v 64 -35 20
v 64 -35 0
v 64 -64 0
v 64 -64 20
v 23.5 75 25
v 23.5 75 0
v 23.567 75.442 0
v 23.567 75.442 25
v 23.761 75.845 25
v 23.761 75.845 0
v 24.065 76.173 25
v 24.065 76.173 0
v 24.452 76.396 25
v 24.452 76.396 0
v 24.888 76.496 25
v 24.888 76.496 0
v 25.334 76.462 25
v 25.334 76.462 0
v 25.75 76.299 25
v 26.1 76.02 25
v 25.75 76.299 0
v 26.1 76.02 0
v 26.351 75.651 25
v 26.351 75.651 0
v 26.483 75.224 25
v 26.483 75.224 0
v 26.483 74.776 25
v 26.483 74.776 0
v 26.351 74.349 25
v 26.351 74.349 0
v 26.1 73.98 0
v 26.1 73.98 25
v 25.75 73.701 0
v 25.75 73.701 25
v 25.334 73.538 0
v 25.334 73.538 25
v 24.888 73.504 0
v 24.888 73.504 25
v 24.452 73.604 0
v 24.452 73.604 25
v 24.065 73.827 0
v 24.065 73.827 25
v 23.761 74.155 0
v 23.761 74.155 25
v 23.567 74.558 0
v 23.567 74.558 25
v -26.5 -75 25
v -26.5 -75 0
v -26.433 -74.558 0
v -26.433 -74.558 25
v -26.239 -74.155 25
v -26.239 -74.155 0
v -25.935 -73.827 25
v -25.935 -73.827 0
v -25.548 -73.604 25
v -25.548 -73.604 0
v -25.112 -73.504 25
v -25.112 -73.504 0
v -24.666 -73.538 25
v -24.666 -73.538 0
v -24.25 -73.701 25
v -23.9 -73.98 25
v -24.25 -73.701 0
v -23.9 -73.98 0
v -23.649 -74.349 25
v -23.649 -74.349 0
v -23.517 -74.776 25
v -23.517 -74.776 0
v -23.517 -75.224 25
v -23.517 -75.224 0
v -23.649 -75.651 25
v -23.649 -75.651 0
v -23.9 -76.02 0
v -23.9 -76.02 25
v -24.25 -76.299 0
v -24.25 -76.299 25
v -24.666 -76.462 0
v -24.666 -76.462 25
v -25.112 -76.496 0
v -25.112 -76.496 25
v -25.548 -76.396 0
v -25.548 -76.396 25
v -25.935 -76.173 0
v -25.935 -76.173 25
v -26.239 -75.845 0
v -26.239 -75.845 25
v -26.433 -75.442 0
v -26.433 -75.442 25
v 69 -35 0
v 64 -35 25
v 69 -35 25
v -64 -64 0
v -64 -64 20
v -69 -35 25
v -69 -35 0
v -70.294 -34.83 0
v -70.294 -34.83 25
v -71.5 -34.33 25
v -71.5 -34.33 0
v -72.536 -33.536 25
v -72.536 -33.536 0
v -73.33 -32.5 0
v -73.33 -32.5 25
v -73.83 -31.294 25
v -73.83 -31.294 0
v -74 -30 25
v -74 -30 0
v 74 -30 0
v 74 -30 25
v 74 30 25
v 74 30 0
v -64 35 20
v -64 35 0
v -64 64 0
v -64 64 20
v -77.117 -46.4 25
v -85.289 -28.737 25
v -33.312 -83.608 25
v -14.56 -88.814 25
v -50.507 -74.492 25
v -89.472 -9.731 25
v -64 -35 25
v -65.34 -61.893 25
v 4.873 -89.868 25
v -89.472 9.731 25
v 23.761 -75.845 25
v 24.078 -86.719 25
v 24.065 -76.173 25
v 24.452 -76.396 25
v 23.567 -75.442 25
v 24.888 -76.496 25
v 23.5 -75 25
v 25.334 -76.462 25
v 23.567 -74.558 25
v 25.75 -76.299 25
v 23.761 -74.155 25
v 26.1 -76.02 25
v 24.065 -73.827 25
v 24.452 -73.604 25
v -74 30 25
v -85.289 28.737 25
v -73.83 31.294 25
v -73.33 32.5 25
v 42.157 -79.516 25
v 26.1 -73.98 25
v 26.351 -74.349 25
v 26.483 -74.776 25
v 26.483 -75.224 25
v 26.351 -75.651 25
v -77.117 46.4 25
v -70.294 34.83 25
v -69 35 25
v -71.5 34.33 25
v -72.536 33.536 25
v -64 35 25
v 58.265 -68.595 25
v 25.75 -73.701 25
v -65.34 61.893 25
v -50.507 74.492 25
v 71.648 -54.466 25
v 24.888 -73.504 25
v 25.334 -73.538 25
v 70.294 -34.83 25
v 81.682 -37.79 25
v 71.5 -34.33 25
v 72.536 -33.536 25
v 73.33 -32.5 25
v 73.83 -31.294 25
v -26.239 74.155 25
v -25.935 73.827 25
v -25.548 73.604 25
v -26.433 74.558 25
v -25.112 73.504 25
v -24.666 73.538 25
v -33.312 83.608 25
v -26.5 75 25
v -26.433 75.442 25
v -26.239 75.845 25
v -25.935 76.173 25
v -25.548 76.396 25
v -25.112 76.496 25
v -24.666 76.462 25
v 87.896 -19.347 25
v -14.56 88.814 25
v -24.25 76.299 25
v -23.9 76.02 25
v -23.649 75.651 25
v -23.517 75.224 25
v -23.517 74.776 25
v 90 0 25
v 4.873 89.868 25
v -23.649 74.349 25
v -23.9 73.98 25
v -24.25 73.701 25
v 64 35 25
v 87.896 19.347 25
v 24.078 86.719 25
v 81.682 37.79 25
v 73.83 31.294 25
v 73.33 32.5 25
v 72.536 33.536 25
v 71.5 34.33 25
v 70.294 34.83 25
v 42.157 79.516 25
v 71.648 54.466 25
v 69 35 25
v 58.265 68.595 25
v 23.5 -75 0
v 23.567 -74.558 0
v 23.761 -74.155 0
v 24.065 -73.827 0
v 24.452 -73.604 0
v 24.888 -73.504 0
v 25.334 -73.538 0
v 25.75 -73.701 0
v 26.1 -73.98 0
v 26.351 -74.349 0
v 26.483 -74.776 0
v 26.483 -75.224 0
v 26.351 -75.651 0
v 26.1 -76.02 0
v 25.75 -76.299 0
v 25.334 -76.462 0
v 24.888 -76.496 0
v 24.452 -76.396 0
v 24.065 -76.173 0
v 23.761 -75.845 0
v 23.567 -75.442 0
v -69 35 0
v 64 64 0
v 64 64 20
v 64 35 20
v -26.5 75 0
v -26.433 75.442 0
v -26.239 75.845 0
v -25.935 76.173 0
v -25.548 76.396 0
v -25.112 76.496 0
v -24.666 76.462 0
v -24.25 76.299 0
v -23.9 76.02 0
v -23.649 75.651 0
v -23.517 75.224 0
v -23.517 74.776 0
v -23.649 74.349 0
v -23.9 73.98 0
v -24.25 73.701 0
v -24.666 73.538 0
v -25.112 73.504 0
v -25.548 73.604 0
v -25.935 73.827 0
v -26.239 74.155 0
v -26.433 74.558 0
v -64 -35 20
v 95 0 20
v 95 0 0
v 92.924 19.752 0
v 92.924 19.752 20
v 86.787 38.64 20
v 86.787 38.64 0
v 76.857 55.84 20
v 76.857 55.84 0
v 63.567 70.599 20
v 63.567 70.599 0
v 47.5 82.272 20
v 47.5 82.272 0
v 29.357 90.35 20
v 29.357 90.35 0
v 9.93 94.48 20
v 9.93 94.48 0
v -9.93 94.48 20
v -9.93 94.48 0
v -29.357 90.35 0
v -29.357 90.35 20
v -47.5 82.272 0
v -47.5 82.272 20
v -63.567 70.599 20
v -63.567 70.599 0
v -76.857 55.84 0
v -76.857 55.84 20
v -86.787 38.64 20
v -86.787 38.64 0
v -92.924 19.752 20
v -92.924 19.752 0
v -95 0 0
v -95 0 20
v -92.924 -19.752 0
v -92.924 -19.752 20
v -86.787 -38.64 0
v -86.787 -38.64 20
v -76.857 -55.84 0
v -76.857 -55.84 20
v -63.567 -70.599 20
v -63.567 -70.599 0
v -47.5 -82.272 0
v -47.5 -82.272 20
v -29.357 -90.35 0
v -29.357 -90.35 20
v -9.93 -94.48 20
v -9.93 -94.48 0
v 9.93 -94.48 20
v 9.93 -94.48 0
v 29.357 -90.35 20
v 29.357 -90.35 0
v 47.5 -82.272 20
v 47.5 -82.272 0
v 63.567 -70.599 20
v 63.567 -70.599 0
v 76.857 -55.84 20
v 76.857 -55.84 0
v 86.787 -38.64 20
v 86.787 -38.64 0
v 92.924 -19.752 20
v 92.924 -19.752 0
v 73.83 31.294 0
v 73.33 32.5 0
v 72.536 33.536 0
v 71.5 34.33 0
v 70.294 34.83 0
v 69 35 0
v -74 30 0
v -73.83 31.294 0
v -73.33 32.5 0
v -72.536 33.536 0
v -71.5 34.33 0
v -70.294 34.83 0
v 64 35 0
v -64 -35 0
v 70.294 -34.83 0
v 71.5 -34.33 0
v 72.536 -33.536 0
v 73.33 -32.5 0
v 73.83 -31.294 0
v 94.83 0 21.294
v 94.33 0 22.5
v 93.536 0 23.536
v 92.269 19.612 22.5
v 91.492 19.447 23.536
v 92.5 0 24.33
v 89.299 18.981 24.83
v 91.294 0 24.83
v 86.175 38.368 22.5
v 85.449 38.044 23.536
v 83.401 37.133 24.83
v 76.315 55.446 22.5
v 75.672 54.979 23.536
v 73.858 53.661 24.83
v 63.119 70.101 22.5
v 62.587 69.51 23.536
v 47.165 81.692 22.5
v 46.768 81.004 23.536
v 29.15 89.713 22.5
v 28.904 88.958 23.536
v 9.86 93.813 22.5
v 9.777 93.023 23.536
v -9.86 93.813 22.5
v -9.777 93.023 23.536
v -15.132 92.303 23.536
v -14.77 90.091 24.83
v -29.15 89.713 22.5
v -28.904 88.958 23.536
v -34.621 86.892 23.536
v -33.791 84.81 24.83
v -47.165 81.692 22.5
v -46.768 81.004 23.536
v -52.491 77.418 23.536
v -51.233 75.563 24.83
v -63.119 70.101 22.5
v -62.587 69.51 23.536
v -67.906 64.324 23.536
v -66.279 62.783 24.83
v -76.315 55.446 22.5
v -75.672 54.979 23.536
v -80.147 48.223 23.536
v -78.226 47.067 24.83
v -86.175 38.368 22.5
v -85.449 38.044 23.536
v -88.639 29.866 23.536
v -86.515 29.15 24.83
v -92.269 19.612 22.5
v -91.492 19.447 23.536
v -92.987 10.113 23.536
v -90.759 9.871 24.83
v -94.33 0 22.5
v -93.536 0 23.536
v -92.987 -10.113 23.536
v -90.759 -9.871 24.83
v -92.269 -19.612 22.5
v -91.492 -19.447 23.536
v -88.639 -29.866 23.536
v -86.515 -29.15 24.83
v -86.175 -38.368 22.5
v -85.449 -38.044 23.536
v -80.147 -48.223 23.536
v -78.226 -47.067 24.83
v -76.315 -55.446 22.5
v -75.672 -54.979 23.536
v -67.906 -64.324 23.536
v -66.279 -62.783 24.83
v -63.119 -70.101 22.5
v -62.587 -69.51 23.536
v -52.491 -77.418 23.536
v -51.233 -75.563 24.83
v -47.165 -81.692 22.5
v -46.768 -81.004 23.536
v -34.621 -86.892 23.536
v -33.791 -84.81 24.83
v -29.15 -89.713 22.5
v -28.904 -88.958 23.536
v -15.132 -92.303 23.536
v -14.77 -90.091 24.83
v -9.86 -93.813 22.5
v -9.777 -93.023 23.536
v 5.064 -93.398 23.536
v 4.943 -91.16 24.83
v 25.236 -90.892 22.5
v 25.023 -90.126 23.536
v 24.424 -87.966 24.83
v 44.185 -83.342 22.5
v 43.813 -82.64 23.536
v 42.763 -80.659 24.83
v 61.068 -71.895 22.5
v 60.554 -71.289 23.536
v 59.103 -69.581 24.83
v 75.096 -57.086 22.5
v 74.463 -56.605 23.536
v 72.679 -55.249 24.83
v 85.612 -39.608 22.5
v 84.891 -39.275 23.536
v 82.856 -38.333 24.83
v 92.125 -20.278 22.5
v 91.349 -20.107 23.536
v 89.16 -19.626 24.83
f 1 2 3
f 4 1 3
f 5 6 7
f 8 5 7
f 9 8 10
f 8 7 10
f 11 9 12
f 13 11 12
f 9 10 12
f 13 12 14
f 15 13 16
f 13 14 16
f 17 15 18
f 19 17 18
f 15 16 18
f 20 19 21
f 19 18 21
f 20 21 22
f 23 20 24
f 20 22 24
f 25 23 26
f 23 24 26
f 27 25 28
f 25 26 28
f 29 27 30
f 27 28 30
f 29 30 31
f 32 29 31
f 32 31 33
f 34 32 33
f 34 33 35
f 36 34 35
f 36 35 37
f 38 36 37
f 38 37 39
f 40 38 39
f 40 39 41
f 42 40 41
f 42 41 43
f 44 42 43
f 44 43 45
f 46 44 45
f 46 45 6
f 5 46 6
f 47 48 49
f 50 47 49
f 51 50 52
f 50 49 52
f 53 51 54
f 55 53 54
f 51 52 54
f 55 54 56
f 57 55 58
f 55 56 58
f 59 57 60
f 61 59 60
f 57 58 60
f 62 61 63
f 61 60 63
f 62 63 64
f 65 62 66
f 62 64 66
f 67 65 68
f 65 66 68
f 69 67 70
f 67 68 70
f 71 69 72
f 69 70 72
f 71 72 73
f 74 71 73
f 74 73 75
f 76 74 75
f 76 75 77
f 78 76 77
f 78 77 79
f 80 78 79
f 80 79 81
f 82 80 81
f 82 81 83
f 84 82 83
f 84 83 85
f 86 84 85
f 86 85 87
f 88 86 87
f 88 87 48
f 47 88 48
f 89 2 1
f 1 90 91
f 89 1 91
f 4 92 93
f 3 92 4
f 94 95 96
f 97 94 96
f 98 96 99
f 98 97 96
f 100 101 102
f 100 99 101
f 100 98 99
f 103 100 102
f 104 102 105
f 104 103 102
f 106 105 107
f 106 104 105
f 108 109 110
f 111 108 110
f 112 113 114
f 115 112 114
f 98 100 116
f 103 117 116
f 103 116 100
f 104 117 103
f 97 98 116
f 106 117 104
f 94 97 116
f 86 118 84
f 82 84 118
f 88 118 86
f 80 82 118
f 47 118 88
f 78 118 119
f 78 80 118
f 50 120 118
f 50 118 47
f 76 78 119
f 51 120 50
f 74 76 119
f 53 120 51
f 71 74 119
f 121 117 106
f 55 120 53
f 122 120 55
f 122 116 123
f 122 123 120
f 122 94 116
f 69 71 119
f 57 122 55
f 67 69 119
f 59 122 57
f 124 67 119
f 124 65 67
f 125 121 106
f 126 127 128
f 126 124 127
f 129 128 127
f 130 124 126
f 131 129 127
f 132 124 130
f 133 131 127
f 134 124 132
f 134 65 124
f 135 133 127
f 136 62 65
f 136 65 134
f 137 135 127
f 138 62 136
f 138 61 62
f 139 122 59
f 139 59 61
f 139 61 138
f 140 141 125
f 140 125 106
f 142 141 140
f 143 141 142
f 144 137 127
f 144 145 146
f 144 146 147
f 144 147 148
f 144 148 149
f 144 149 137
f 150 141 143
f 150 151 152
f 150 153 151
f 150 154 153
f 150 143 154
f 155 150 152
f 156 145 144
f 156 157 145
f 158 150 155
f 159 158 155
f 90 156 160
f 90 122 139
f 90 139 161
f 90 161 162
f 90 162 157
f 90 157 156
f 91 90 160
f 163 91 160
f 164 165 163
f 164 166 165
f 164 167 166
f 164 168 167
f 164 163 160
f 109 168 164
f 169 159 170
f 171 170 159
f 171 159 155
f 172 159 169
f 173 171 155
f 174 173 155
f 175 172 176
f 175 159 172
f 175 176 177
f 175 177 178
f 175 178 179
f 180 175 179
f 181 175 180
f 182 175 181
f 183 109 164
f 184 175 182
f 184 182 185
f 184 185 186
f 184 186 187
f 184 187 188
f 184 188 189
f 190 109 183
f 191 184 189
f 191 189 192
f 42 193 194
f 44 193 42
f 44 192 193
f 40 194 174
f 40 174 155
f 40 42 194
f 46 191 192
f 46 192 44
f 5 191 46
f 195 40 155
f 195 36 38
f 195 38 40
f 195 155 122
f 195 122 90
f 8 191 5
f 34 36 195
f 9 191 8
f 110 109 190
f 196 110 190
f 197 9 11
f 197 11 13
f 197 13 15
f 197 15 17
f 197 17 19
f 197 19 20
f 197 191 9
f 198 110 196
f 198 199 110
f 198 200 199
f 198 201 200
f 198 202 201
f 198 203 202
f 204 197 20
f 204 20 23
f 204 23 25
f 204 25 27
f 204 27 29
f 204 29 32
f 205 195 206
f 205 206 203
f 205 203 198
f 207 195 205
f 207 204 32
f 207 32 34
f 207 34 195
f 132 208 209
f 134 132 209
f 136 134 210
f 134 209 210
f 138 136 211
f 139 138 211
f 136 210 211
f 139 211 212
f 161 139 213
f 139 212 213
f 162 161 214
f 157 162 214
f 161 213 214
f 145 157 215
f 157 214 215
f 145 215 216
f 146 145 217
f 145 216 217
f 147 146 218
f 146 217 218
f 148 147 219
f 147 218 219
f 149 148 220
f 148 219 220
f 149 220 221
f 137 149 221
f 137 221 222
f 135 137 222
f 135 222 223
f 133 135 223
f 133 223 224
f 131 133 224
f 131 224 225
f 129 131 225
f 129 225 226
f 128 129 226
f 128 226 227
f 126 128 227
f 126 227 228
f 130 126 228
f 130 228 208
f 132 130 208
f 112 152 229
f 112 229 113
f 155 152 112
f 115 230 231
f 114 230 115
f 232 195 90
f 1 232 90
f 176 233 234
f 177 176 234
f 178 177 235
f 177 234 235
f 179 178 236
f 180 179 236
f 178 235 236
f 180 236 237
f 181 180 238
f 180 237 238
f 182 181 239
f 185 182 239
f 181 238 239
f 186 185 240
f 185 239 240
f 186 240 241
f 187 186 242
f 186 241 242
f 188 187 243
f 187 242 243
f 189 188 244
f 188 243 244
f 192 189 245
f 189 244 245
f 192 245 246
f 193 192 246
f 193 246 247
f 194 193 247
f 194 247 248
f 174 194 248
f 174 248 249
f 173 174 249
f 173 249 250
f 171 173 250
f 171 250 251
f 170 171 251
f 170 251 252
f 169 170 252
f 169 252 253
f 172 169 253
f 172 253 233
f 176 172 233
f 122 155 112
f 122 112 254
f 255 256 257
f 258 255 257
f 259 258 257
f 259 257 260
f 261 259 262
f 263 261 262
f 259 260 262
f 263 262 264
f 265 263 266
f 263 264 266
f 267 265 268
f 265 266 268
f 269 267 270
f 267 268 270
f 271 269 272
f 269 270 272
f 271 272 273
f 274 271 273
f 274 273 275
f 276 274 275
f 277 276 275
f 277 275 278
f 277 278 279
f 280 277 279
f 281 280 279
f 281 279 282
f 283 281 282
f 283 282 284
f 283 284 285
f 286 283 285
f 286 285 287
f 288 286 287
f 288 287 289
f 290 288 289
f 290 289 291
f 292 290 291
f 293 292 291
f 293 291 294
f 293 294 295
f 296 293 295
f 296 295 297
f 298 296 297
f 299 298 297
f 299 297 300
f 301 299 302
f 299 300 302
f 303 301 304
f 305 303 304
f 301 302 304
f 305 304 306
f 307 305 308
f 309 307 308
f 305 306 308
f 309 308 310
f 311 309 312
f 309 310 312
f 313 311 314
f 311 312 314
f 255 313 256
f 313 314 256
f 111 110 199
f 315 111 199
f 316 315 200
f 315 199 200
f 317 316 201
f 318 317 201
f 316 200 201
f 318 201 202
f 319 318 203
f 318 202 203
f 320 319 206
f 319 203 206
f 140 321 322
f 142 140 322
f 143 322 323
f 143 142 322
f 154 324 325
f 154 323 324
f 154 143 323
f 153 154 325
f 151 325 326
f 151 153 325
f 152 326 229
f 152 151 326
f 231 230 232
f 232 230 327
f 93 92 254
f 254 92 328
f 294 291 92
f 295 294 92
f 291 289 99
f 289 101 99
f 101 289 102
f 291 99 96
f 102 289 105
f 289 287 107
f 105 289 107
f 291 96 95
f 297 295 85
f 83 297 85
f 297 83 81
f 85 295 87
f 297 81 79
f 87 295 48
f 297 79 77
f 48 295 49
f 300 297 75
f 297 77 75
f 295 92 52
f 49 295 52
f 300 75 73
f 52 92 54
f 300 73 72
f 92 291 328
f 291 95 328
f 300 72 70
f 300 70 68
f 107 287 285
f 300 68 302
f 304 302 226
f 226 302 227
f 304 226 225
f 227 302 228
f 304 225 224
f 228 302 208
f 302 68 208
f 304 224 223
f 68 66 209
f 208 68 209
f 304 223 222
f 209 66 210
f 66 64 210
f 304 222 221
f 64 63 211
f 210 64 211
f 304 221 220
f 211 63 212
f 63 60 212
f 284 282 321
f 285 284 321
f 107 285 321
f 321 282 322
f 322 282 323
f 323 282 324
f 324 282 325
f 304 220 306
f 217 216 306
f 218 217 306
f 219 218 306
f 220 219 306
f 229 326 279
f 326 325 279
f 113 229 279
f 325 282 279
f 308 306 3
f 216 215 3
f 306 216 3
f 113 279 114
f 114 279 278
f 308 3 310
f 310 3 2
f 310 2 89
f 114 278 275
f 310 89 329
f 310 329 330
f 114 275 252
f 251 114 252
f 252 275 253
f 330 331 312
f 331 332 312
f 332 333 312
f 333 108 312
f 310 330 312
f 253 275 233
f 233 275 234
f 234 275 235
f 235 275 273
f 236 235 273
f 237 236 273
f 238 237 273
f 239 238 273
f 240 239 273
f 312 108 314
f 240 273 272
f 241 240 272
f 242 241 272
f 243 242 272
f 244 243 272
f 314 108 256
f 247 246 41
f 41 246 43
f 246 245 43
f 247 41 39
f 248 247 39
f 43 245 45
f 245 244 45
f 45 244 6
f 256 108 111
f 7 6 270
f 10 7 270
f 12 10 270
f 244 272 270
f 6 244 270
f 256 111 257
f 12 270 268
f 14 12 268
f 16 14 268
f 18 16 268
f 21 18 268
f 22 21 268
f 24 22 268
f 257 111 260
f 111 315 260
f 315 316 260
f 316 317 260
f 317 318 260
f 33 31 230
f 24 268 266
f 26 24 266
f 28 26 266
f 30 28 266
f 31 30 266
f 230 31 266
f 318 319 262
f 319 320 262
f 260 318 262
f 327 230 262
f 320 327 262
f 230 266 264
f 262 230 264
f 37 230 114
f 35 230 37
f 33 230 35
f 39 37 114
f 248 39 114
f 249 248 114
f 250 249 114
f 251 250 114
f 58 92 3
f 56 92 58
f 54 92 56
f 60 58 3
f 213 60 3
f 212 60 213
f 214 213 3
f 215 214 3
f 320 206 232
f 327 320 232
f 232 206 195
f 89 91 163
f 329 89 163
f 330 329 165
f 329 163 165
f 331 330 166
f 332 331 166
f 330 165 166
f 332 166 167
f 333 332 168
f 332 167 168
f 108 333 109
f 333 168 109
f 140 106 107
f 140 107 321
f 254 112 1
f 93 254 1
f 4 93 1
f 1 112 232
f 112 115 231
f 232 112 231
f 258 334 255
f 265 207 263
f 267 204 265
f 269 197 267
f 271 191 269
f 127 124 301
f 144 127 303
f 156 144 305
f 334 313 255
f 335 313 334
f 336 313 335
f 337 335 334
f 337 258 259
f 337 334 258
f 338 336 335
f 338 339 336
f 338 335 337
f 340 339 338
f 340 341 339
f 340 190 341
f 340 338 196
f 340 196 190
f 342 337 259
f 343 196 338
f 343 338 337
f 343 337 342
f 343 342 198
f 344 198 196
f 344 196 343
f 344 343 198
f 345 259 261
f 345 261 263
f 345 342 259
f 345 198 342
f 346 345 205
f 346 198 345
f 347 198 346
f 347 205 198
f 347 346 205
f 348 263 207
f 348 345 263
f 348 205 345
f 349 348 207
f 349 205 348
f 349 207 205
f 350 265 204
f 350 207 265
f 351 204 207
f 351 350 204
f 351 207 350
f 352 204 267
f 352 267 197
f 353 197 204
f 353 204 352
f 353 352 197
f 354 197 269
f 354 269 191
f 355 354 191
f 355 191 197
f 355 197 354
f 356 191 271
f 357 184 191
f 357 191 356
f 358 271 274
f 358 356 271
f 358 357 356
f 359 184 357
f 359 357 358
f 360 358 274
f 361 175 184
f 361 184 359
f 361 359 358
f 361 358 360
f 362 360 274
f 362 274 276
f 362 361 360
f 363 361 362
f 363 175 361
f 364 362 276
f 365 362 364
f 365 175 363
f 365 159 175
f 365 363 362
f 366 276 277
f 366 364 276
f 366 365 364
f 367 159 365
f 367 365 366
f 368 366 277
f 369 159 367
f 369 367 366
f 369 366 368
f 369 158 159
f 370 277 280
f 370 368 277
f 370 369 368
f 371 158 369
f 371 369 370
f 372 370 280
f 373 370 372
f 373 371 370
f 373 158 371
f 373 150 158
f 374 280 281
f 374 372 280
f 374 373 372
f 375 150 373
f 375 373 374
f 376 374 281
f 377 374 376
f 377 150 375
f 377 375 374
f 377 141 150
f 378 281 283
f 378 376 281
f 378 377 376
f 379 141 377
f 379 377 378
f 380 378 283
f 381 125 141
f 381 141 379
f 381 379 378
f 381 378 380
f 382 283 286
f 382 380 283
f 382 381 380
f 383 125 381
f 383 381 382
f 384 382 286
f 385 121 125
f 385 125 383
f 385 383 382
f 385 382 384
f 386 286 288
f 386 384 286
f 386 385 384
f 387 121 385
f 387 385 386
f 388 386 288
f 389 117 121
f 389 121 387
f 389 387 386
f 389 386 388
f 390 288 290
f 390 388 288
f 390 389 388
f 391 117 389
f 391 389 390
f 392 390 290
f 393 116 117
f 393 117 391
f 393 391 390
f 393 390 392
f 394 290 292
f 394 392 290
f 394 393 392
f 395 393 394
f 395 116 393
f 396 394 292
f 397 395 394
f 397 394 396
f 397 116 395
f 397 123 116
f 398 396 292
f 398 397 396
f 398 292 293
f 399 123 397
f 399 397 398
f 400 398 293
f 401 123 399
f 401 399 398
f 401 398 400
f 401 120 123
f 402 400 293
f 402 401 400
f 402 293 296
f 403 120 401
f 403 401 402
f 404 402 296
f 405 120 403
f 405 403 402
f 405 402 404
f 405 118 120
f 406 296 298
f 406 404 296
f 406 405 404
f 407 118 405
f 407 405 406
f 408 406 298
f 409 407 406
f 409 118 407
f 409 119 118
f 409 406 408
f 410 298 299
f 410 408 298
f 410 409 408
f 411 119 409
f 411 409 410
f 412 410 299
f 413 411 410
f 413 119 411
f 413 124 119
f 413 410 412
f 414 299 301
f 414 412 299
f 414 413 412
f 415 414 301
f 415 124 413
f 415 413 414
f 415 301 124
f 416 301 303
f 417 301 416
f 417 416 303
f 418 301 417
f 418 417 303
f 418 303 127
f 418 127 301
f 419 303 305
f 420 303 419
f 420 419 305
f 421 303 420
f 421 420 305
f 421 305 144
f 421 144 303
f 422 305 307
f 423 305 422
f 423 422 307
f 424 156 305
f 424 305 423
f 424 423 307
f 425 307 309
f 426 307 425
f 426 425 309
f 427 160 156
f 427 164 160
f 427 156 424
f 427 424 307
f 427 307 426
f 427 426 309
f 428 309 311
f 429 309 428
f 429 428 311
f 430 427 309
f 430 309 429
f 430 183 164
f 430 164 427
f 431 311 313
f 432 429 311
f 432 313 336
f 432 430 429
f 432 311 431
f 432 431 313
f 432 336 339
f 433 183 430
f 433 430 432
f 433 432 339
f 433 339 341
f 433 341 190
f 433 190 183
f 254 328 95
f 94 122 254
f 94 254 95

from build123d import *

# Parameters (mm, degrees)
SKETCH_1_R               = 95
EXTRUDE_1_DEPTH          = 20
SKETCH_2_R               = 95
EXTRUDE_2_DEPTH          = 5
FILLET_1_R               = 5
SKETCH_5_R               = 1.5
CUT_EXTRUDE_2_DEPTH      = 137.656503775
CUT_EXTRUDE_9_DEPTH      = 136.830777142
CUT_EXTRUDE_9_DEPTH_BACK = 136.830777142


with BuildPart() as part:
    # 草圖1 → 填料-伸長1 (new body)
    with BuildSketch(Plane.XY):
        Circle(SKETCH_1_R)
        Polygon((64, 64), (-64, 64), (-64, 34.210333771), (-64, -34.210333771), (-64, -64), (64, -64), (64, -34.210333771), (64, 34.210333771), align=None, mode=Mode.SUBTRACT)
    extrude(amount=EXTRUDE_1_DEPTH)

    # 草圖2 → 填料-伸長2 (add)
    with BuildSketch(Plane.XY.offset(20)):
        Circle(SKETCH_2_R)
    extrude(amount=EXTRUDE_2_DEPTH)

    # 圓角1
    fillet_1_edges = [part.edges().sort_by_distance(p)[0] for p in [
        (-95, 0, 25),
    ]]
    fillet(fillet_1_edges, radius=FILLET_1_R)

    # 草圖5 → 除料-伸長2 (cut, through all)
    with BuildSketch(Plane(origin=(0, 0, 0), x_dir=(-1, 0, 0), z_dir=(0, 0, -1))):
        with Locations((-25, 75)):
            Circle(SKETCH_5_R)
        with Locations((25, 75)):
            Circle(SKETCH_5_R)
        with Locations((25, -75)):
            Circle(SKETCH_5_R)
        with Locations((-25, -75)):
            Circle(SKETCH_5_R)
    extrude(amount=-CUT_EXTRUDE_2_DEPTH, mode=Mode.SUBTRACT)

    # 草圖6 → 除料-伸長9 (cut, two sides: drawn at the far end of the back side and taken through both)
    with BuildSketch(Plane(origin=(0, 0, 20), x_dir=(-1, 0, 0), z_dir=(0, 0, -1)).offset(-CUT_EXTRUDE_9_DEPTH_BACK)):
        with BuildLine():
            Line((-64, 35), (-64, -35))
            Line((-64, -35), (-69, -35))
            ThreePointArc((-69, -35), (-72.535533906, -33.535533906), (-74, -30))
            Line((-74, -30), (-74, 30))
            ThreePointArc((-74, 30), (-72.535533906, 33.535533906), (-69, 35))
            Line((-69, 35), (-64, 35))
        make_face()
        with BuildLine():
            Line((64, -35), (69, -35))
            ThreePointArc((69, -35), (72.535533906, -33.535533906), (74, -30))
            Line((74, -30), (74, 30))
            ThreePointArc((74, 30), (72.535533906, 33.535533906), (69, 35))
            Line((69, 35), (64, 35))
            Line((64, 35), (64, -35))
        make_face()
    extrude(amount=CUT_EXTRUDE_9_DEPTH + CUT_EXTRUDE_9_DEPTH_BACK, mode=Mode.SUBTRACT)


solid = part.part
